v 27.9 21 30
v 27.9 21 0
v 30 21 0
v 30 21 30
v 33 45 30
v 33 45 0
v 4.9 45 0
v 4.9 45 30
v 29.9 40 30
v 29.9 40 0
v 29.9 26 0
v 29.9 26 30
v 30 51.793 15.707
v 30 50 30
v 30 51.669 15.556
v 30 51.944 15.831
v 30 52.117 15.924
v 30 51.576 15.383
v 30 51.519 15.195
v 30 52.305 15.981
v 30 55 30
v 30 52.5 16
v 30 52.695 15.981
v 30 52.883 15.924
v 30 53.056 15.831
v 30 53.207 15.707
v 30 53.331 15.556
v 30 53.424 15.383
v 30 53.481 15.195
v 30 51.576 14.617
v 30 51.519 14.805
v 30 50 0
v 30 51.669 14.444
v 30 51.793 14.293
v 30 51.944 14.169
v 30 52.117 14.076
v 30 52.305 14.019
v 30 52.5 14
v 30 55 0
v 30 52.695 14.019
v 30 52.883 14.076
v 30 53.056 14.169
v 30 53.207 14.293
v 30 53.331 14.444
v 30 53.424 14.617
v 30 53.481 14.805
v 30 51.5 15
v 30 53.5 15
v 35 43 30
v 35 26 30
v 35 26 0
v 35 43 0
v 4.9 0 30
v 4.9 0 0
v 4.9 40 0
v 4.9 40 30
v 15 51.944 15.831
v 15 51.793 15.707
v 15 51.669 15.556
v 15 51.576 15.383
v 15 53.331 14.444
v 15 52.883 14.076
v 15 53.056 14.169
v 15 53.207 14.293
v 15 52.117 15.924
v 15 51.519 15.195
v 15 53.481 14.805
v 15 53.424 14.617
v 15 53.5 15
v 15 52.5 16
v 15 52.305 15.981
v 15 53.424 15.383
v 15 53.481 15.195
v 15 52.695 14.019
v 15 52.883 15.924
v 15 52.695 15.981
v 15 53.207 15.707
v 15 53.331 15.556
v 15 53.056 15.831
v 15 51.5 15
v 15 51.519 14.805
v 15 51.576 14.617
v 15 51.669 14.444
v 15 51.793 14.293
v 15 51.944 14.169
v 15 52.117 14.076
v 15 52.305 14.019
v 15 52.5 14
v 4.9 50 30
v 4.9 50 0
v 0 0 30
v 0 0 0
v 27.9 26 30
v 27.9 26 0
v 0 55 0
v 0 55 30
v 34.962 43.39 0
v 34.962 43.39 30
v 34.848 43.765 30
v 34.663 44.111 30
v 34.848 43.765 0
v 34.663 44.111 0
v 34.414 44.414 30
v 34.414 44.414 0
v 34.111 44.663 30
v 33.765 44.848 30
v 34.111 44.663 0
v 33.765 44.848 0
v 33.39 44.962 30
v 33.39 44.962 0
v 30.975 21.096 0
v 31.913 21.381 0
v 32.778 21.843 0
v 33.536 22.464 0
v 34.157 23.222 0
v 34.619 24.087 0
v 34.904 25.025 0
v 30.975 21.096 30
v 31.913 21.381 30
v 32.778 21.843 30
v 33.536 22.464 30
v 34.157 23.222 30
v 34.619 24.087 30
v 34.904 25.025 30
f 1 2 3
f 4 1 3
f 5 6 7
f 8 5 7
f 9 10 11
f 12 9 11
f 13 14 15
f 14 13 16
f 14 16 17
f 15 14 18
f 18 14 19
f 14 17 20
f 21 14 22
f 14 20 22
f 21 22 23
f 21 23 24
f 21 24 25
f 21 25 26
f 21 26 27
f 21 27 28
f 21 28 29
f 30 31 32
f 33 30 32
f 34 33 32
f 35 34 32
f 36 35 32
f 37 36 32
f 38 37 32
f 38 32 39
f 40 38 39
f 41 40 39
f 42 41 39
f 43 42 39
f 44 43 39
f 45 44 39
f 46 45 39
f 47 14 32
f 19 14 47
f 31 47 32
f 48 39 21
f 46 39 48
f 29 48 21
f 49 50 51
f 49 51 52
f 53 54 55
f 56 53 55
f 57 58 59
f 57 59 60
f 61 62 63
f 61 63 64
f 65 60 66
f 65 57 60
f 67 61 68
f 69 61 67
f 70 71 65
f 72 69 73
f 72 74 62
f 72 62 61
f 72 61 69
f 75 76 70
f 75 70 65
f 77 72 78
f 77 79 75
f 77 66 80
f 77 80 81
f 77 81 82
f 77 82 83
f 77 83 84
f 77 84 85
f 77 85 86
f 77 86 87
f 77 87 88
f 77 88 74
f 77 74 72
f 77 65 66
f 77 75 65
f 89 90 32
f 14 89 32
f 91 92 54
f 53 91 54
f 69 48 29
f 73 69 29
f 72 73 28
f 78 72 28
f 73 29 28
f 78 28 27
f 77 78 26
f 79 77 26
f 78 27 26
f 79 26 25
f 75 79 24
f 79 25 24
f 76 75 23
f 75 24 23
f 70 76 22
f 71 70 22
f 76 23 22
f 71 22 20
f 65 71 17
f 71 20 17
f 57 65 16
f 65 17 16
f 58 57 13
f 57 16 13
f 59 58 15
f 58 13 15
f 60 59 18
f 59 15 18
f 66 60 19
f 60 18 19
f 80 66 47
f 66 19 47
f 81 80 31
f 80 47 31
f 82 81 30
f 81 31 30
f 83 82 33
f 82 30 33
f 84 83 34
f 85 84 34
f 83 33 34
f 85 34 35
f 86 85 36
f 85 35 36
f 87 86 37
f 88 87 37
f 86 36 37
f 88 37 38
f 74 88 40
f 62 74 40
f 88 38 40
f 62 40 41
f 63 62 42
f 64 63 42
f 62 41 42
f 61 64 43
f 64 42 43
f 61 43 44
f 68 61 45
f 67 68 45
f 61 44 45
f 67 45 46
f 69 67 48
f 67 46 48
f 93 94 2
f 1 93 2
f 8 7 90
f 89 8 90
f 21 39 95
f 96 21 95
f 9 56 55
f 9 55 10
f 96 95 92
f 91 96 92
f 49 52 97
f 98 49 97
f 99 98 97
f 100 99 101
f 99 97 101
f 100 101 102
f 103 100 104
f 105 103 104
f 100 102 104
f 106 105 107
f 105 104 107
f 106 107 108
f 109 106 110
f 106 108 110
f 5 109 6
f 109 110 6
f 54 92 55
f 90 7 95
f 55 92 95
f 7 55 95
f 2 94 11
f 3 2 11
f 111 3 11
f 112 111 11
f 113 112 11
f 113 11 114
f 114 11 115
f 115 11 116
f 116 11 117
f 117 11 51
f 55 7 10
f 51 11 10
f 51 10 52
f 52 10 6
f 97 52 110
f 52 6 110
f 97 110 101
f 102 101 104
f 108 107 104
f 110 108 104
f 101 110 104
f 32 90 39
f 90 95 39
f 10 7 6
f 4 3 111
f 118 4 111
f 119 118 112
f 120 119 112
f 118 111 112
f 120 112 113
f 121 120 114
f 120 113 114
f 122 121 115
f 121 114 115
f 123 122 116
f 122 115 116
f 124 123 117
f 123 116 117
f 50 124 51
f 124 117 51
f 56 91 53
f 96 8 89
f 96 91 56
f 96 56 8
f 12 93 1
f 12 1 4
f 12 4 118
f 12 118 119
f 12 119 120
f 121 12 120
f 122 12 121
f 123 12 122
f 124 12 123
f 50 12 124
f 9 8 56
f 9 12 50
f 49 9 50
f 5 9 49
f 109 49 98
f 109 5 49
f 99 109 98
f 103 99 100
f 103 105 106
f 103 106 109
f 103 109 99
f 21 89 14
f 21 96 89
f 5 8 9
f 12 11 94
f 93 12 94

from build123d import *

# Parameters (mm, degrees)
F1_DEPTH = 30
F2_R     = 1
F3_DEPTH = 15


with BuildPart() as f1:
    # F0 (on Top) → F1 (new body)
    with BuildSketch(Plane.XY):
        with BuildLine():
            Line((0, 45), (0, 0))
            Line((0, 0), (4.900002, 0))
            Line((4.900002, 0), (4.900002, 40))
            Line((4.900002, 40), (29.900002, 40))
            Line((29.900002, 40), (29.900002, 26))
            Line((29.900002, 26), (27.900002, 26))
            Line((27.900002, 26), (27.900002, 21))
            Line((27.900002, 21), (30, 21))
            ThreePointArc((30, 21), (33.535534, 22.464466), (35, 26))
            Line((35, 26), (35, 43))
            ThreePointArc((35, 43), (34.414214, 44.414214), (33, 45))
            Line((33, 45), (4.900002, 45))
            Line((4.900002, 45), (4.900002, 50))
            Line((4.900002, 50), (30, 50))
            Line((30, 50), (30, 55))
            Line((30, 55), (0, 55))
            Line((0, 55), (0, 45))
        make_face()
    extrude(amount=F1_DEPTH)

    # F2 (on face) → F3 (cut)
    with BuildSketch(Plane.YZ.offset(30)):
        with Locations((52.5, 15)):
            Circle(F2_R)
    extrude(amount=-F3_DEPTH, mode=Mode.SUBTRACT)


solid = f1.part
